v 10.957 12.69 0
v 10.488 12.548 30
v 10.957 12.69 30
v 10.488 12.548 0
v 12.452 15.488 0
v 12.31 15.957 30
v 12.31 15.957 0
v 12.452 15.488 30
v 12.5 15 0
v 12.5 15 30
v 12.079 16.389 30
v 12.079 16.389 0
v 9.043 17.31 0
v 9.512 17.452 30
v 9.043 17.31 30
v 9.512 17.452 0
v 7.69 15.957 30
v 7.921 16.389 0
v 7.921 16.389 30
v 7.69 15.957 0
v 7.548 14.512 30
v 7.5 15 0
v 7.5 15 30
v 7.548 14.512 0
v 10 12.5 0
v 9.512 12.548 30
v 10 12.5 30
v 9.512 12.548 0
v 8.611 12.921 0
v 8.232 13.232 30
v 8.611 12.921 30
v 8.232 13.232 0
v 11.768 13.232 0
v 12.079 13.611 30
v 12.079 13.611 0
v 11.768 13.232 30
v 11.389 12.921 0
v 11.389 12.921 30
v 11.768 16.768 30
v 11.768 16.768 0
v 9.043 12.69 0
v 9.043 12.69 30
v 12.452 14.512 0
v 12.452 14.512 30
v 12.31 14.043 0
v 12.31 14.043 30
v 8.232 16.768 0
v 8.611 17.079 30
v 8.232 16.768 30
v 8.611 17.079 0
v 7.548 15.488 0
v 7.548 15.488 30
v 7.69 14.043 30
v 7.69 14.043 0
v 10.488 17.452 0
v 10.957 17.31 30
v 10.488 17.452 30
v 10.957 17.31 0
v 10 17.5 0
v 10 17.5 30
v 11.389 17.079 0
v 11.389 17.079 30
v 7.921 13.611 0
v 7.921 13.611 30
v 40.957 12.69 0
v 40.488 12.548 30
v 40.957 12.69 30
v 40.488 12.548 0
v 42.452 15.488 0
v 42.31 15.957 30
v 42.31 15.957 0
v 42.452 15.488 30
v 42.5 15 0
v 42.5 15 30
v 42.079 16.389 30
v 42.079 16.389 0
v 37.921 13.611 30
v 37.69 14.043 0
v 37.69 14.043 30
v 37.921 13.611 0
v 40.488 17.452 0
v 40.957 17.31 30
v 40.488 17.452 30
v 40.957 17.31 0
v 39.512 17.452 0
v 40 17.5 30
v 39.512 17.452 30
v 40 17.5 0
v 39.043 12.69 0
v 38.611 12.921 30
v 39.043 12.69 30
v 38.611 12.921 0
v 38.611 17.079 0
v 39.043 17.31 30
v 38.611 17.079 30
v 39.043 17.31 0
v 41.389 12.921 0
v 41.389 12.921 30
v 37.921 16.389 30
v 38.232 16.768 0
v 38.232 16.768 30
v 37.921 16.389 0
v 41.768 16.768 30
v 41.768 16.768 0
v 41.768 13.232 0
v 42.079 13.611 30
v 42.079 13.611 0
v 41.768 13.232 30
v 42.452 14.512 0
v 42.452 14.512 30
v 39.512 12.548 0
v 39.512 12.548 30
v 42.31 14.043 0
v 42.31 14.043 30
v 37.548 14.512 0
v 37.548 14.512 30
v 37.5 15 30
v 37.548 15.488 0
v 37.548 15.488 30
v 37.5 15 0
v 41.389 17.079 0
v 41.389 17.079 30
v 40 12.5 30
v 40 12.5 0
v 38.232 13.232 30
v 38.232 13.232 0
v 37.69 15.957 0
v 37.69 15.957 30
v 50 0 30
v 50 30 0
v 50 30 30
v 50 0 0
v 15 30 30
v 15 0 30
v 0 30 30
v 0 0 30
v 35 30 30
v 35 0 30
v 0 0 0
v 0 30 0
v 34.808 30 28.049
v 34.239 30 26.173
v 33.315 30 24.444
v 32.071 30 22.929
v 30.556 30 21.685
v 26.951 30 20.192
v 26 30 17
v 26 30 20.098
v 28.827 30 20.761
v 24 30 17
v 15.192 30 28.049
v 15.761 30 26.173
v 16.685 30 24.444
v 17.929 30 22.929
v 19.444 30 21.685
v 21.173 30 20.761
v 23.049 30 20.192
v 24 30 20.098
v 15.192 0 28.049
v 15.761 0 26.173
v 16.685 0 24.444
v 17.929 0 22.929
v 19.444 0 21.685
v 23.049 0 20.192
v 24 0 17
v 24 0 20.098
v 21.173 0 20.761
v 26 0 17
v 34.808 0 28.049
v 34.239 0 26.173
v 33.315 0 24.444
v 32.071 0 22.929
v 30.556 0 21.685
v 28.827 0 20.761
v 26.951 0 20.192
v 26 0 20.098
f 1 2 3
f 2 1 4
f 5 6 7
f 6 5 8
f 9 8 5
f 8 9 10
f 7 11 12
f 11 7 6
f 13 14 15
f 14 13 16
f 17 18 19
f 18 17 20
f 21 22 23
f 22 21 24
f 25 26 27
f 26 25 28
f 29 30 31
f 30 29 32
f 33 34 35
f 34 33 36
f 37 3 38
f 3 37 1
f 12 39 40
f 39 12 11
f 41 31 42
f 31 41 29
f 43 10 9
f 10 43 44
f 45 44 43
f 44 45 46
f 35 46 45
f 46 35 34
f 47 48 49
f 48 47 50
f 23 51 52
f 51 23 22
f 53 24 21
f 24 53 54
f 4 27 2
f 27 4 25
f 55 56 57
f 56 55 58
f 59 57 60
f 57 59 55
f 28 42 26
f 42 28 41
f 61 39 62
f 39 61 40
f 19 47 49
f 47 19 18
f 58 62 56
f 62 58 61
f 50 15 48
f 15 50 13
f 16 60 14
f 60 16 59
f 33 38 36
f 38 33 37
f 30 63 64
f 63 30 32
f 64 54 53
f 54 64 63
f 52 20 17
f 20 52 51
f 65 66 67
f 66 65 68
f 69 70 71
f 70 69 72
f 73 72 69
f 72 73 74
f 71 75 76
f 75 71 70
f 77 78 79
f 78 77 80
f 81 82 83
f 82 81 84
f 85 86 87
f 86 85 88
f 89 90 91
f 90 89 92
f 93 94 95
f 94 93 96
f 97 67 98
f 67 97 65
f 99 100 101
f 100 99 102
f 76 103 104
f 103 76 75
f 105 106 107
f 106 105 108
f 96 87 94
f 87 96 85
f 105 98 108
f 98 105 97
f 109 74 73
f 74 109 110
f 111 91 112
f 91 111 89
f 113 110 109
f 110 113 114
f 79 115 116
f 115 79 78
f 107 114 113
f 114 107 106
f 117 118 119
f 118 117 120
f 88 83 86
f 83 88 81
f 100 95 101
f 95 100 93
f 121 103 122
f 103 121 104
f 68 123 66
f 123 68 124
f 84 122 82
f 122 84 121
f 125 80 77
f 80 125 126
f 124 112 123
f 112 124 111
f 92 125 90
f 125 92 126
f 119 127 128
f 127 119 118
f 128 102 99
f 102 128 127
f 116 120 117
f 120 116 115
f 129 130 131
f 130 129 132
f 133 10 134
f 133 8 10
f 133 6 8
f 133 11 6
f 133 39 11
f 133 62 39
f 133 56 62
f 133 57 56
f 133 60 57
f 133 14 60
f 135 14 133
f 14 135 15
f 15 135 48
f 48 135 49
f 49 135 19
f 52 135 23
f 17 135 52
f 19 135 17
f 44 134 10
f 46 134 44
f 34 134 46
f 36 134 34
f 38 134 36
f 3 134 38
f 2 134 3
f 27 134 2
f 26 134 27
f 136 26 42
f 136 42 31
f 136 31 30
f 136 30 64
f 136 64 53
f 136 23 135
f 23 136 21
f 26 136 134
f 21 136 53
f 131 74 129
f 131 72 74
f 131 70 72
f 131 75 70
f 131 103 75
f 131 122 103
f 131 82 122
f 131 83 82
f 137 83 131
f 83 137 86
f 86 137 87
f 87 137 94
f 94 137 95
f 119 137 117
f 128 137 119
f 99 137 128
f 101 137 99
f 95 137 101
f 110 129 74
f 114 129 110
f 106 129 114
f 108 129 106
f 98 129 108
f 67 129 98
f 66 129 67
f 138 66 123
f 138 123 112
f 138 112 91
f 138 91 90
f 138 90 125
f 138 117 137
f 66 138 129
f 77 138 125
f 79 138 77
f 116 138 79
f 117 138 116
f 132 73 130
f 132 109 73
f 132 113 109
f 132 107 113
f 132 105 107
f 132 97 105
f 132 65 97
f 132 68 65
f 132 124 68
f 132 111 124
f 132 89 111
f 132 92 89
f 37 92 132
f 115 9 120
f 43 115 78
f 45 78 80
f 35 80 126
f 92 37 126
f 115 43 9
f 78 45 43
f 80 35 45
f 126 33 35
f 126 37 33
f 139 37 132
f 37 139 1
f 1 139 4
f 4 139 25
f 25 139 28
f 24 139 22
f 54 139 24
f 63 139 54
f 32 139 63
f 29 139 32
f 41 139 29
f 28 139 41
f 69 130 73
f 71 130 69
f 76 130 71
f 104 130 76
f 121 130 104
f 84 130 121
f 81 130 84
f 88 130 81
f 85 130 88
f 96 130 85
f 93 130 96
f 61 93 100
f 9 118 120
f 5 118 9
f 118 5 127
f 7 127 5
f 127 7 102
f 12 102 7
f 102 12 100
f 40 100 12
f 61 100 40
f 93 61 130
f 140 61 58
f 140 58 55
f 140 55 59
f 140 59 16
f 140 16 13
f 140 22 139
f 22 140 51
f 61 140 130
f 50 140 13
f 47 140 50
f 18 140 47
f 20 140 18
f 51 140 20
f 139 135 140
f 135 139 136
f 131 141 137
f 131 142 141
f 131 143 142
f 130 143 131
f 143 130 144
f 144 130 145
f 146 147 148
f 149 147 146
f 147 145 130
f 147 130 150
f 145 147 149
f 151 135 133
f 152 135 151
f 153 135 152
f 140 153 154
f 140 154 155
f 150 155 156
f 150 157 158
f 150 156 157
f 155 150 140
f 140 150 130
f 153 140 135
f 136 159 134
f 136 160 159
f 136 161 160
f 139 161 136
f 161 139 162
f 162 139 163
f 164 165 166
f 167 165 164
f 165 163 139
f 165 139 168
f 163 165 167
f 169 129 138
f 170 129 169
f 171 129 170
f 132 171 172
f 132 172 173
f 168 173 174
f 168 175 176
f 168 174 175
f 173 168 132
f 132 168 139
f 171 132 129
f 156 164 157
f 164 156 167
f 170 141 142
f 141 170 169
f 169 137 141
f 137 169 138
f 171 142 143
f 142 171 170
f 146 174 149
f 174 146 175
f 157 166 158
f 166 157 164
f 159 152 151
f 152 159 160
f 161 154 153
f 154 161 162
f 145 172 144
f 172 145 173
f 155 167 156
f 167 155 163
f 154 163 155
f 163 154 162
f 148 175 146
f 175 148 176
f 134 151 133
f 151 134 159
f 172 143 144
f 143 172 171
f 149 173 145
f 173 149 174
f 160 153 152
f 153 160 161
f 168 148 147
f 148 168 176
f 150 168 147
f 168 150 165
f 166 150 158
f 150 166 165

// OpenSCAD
$fn = 32;

// ----------------------------------------------------------------------
// Saddle clamp: split shaft clamp
// ----------------------------------------------------------------------

// --- parameters (mm) ---
blk_l = 50;               // block length, X
blk_w = 30;               // block width, Y
blk_h = 30;               // block height
clamp_r = 10;             // shaft groove radius
hole_r = 2.5;             // bolt hole radius
hole_m = 10;              // bolt hole margin from the ends
saw_w = 2;                // saw kerf width
fit_tol = 0.1;            // tolerance for press fits, mm
free_tol = 0.5;           // tolerance for clearance fits, mm

saw_depth = clamp_r + 3;  // saw kerf depth

difference() {
  cube([blk_l, blk_w, blk_h]);
  translate([blk_l / 2, -1, blk_h])
    rotate([-90, 0, 0])
      cylinder(h = blk_w + 2, r = clamp_r);
  for (sx = [0, 1])
    translate([sx ? blk_l - hole_m : hole_m, blk_w / 2, -1])
      cylinder(r = hole_r, h = blk_h + 2);
  translate([blk_l / 2 - saw_w / 2, -1, blk_h - saw_depth])
    cube([saw_w, blk_w + 2, saw_depth + 1]);
}
